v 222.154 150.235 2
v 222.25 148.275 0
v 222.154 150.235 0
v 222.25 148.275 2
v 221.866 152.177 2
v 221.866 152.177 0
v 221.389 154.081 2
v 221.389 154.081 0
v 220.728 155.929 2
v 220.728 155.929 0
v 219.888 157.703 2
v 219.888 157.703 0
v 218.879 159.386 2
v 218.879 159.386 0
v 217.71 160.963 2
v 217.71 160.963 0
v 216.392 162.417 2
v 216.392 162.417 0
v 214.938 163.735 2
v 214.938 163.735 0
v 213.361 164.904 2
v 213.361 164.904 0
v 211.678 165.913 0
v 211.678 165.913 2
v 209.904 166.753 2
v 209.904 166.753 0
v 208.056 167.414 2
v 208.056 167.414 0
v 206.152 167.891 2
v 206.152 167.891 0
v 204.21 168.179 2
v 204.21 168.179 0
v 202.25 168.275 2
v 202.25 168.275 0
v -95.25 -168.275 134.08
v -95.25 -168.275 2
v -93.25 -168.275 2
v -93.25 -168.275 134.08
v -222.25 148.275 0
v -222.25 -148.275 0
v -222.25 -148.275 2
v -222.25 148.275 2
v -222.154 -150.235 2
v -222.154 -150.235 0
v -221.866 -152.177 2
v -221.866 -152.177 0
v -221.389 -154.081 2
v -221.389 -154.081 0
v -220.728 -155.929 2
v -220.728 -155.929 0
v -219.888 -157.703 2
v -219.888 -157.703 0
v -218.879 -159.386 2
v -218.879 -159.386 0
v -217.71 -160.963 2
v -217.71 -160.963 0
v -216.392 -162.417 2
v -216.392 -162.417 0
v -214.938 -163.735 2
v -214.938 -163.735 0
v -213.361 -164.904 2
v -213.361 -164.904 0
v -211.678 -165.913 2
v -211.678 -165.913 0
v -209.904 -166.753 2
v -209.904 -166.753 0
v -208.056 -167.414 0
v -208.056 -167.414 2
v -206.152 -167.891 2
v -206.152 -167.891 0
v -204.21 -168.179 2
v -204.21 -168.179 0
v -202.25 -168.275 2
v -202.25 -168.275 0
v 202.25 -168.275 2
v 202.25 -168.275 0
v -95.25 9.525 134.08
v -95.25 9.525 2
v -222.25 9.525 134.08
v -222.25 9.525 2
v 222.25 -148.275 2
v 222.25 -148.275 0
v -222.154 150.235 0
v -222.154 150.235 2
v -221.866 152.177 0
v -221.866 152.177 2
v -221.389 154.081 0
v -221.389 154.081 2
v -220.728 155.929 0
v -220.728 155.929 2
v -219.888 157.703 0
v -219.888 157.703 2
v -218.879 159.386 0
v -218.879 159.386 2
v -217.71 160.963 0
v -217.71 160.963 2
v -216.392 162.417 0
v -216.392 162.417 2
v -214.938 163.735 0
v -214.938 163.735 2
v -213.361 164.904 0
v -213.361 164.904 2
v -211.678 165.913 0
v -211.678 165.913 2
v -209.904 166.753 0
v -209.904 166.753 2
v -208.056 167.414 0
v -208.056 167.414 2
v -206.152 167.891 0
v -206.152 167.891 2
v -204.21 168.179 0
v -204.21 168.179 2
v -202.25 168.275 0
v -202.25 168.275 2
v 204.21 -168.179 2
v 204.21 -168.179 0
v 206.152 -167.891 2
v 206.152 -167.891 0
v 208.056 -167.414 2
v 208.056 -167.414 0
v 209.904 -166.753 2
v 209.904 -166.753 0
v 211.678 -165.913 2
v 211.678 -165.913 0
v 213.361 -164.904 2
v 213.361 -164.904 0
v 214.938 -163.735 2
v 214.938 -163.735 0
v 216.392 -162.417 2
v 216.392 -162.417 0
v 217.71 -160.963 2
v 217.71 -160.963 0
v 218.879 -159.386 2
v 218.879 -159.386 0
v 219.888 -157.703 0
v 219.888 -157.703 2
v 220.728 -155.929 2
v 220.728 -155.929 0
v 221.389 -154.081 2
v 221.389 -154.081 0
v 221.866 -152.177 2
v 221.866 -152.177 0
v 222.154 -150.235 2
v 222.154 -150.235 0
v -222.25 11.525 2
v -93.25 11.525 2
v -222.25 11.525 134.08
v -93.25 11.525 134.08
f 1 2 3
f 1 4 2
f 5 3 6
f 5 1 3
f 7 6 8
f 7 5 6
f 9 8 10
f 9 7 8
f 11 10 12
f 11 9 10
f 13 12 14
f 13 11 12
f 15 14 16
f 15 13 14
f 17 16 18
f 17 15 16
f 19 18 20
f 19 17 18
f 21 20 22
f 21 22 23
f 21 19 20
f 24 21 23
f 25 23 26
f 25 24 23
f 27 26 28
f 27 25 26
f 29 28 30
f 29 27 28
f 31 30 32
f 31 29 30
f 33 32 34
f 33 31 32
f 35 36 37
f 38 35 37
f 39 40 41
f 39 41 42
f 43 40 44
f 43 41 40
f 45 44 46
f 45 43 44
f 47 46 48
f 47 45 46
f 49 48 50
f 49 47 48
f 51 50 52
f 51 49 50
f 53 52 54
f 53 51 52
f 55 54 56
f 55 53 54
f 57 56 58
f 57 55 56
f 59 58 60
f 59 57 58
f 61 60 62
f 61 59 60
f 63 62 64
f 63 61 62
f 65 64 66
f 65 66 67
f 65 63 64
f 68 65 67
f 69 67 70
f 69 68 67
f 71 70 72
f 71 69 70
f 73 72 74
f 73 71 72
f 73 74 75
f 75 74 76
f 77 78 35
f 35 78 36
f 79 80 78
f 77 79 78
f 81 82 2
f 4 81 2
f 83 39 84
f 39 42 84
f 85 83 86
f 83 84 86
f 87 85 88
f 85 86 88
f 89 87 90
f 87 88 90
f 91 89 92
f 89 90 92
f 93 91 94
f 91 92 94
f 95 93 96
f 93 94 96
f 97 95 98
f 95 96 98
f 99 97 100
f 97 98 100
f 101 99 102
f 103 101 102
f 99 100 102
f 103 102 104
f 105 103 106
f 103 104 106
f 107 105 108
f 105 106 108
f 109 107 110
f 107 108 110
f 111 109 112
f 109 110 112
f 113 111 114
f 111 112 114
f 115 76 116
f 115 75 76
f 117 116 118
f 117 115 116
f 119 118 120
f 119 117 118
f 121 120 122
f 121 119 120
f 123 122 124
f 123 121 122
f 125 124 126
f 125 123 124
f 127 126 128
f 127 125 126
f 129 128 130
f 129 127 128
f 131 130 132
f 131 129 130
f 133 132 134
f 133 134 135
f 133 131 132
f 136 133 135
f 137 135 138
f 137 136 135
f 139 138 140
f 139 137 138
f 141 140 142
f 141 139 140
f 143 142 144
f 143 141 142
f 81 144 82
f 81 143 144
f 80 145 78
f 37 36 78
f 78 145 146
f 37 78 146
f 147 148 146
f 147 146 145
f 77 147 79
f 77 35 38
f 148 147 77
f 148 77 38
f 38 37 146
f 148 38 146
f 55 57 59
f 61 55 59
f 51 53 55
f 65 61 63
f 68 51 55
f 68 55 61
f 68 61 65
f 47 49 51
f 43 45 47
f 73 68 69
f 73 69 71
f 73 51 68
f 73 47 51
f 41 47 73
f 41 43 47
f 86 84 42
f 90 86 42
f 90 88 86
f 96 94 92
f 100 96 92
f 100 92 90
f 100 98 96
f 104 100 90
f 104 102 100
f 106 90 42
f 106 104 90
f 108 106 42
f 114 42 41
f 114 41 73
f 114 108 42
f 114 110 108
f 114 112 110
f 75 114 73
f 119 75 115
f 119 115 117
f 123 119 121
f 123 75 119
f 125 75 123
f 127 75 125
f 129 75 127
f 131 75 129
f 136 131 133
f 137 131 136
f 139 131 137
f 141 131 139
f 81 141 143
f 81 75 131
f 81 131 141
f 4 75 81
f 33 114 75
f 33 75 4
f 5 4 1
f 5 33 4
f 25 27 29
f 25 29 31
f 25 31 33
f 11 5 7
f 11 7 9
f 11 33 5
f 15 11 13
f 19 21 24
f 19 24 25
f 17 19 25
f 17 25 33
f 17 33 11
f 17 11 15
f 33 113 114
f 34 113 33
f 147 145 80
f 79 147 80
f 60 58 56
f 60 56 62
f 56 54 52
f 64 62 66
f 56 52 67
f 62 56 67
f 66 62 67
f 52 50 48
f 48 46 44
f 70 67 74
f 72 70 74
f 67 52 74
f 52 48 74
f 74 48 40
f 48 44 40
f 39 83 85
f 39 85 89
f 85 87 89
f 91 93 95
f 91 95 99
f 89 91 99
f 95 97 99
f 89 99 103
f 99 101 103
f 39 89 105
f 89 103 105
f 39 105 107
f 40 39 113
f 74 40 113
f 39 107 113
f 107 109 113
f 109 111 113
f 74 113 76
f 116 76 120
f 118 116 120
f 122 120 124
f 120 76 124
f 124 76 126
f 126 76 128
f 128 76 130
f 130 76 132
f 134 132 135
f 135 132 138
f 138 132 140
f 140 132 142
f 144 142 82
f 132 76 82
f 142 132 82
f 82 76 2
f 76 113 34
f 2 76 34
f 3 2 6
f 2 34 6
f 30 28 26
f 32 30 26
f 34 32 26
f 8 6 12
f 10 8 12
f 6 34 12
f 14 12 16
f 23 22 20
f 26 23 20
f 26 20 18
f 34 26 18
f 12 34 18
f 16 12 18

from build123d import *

# Parameters (mm, degrees)
F0_W     = 444.5
F0_H     = 336.55
F1_DEPTH = 2
F3_DEPTH = 132.08
F4_R     = 20


with BuildPart() as f1:
    # F0 (on Top) → F1 (new body)
    with BuildSketch(Plane.XY):
        Rectangle(F0_W, F0_H)
    extrude(amount=F1_DEPTH)

    # F4
    f4_edges = [f1.edges().sort_by_distance(p)[0] for p in [
        (222.25, -168.275, 1),
        (-222.25, -168.275, 1),
        (-222.25, 168.275, 1),
        (222.25, 168.275, 1),
    ]]
    fillet(f4_edges, radius=F4_R)


with BuildPart() as f3:
    # F2 (on face) → F3 (new body)
    with BuildSketch(Plane.XY.offset(2)):
        Polygon((-222.25, 11.525), (-222.25, 9.525), (-95.25, 9.525), (-95.25, -168.275), (-93.25, -168.275), (-93.25, 11.525), align=None)
    extrude(amount=F3_DEPTH)


solid = Compound([f1.part, f3.part])
